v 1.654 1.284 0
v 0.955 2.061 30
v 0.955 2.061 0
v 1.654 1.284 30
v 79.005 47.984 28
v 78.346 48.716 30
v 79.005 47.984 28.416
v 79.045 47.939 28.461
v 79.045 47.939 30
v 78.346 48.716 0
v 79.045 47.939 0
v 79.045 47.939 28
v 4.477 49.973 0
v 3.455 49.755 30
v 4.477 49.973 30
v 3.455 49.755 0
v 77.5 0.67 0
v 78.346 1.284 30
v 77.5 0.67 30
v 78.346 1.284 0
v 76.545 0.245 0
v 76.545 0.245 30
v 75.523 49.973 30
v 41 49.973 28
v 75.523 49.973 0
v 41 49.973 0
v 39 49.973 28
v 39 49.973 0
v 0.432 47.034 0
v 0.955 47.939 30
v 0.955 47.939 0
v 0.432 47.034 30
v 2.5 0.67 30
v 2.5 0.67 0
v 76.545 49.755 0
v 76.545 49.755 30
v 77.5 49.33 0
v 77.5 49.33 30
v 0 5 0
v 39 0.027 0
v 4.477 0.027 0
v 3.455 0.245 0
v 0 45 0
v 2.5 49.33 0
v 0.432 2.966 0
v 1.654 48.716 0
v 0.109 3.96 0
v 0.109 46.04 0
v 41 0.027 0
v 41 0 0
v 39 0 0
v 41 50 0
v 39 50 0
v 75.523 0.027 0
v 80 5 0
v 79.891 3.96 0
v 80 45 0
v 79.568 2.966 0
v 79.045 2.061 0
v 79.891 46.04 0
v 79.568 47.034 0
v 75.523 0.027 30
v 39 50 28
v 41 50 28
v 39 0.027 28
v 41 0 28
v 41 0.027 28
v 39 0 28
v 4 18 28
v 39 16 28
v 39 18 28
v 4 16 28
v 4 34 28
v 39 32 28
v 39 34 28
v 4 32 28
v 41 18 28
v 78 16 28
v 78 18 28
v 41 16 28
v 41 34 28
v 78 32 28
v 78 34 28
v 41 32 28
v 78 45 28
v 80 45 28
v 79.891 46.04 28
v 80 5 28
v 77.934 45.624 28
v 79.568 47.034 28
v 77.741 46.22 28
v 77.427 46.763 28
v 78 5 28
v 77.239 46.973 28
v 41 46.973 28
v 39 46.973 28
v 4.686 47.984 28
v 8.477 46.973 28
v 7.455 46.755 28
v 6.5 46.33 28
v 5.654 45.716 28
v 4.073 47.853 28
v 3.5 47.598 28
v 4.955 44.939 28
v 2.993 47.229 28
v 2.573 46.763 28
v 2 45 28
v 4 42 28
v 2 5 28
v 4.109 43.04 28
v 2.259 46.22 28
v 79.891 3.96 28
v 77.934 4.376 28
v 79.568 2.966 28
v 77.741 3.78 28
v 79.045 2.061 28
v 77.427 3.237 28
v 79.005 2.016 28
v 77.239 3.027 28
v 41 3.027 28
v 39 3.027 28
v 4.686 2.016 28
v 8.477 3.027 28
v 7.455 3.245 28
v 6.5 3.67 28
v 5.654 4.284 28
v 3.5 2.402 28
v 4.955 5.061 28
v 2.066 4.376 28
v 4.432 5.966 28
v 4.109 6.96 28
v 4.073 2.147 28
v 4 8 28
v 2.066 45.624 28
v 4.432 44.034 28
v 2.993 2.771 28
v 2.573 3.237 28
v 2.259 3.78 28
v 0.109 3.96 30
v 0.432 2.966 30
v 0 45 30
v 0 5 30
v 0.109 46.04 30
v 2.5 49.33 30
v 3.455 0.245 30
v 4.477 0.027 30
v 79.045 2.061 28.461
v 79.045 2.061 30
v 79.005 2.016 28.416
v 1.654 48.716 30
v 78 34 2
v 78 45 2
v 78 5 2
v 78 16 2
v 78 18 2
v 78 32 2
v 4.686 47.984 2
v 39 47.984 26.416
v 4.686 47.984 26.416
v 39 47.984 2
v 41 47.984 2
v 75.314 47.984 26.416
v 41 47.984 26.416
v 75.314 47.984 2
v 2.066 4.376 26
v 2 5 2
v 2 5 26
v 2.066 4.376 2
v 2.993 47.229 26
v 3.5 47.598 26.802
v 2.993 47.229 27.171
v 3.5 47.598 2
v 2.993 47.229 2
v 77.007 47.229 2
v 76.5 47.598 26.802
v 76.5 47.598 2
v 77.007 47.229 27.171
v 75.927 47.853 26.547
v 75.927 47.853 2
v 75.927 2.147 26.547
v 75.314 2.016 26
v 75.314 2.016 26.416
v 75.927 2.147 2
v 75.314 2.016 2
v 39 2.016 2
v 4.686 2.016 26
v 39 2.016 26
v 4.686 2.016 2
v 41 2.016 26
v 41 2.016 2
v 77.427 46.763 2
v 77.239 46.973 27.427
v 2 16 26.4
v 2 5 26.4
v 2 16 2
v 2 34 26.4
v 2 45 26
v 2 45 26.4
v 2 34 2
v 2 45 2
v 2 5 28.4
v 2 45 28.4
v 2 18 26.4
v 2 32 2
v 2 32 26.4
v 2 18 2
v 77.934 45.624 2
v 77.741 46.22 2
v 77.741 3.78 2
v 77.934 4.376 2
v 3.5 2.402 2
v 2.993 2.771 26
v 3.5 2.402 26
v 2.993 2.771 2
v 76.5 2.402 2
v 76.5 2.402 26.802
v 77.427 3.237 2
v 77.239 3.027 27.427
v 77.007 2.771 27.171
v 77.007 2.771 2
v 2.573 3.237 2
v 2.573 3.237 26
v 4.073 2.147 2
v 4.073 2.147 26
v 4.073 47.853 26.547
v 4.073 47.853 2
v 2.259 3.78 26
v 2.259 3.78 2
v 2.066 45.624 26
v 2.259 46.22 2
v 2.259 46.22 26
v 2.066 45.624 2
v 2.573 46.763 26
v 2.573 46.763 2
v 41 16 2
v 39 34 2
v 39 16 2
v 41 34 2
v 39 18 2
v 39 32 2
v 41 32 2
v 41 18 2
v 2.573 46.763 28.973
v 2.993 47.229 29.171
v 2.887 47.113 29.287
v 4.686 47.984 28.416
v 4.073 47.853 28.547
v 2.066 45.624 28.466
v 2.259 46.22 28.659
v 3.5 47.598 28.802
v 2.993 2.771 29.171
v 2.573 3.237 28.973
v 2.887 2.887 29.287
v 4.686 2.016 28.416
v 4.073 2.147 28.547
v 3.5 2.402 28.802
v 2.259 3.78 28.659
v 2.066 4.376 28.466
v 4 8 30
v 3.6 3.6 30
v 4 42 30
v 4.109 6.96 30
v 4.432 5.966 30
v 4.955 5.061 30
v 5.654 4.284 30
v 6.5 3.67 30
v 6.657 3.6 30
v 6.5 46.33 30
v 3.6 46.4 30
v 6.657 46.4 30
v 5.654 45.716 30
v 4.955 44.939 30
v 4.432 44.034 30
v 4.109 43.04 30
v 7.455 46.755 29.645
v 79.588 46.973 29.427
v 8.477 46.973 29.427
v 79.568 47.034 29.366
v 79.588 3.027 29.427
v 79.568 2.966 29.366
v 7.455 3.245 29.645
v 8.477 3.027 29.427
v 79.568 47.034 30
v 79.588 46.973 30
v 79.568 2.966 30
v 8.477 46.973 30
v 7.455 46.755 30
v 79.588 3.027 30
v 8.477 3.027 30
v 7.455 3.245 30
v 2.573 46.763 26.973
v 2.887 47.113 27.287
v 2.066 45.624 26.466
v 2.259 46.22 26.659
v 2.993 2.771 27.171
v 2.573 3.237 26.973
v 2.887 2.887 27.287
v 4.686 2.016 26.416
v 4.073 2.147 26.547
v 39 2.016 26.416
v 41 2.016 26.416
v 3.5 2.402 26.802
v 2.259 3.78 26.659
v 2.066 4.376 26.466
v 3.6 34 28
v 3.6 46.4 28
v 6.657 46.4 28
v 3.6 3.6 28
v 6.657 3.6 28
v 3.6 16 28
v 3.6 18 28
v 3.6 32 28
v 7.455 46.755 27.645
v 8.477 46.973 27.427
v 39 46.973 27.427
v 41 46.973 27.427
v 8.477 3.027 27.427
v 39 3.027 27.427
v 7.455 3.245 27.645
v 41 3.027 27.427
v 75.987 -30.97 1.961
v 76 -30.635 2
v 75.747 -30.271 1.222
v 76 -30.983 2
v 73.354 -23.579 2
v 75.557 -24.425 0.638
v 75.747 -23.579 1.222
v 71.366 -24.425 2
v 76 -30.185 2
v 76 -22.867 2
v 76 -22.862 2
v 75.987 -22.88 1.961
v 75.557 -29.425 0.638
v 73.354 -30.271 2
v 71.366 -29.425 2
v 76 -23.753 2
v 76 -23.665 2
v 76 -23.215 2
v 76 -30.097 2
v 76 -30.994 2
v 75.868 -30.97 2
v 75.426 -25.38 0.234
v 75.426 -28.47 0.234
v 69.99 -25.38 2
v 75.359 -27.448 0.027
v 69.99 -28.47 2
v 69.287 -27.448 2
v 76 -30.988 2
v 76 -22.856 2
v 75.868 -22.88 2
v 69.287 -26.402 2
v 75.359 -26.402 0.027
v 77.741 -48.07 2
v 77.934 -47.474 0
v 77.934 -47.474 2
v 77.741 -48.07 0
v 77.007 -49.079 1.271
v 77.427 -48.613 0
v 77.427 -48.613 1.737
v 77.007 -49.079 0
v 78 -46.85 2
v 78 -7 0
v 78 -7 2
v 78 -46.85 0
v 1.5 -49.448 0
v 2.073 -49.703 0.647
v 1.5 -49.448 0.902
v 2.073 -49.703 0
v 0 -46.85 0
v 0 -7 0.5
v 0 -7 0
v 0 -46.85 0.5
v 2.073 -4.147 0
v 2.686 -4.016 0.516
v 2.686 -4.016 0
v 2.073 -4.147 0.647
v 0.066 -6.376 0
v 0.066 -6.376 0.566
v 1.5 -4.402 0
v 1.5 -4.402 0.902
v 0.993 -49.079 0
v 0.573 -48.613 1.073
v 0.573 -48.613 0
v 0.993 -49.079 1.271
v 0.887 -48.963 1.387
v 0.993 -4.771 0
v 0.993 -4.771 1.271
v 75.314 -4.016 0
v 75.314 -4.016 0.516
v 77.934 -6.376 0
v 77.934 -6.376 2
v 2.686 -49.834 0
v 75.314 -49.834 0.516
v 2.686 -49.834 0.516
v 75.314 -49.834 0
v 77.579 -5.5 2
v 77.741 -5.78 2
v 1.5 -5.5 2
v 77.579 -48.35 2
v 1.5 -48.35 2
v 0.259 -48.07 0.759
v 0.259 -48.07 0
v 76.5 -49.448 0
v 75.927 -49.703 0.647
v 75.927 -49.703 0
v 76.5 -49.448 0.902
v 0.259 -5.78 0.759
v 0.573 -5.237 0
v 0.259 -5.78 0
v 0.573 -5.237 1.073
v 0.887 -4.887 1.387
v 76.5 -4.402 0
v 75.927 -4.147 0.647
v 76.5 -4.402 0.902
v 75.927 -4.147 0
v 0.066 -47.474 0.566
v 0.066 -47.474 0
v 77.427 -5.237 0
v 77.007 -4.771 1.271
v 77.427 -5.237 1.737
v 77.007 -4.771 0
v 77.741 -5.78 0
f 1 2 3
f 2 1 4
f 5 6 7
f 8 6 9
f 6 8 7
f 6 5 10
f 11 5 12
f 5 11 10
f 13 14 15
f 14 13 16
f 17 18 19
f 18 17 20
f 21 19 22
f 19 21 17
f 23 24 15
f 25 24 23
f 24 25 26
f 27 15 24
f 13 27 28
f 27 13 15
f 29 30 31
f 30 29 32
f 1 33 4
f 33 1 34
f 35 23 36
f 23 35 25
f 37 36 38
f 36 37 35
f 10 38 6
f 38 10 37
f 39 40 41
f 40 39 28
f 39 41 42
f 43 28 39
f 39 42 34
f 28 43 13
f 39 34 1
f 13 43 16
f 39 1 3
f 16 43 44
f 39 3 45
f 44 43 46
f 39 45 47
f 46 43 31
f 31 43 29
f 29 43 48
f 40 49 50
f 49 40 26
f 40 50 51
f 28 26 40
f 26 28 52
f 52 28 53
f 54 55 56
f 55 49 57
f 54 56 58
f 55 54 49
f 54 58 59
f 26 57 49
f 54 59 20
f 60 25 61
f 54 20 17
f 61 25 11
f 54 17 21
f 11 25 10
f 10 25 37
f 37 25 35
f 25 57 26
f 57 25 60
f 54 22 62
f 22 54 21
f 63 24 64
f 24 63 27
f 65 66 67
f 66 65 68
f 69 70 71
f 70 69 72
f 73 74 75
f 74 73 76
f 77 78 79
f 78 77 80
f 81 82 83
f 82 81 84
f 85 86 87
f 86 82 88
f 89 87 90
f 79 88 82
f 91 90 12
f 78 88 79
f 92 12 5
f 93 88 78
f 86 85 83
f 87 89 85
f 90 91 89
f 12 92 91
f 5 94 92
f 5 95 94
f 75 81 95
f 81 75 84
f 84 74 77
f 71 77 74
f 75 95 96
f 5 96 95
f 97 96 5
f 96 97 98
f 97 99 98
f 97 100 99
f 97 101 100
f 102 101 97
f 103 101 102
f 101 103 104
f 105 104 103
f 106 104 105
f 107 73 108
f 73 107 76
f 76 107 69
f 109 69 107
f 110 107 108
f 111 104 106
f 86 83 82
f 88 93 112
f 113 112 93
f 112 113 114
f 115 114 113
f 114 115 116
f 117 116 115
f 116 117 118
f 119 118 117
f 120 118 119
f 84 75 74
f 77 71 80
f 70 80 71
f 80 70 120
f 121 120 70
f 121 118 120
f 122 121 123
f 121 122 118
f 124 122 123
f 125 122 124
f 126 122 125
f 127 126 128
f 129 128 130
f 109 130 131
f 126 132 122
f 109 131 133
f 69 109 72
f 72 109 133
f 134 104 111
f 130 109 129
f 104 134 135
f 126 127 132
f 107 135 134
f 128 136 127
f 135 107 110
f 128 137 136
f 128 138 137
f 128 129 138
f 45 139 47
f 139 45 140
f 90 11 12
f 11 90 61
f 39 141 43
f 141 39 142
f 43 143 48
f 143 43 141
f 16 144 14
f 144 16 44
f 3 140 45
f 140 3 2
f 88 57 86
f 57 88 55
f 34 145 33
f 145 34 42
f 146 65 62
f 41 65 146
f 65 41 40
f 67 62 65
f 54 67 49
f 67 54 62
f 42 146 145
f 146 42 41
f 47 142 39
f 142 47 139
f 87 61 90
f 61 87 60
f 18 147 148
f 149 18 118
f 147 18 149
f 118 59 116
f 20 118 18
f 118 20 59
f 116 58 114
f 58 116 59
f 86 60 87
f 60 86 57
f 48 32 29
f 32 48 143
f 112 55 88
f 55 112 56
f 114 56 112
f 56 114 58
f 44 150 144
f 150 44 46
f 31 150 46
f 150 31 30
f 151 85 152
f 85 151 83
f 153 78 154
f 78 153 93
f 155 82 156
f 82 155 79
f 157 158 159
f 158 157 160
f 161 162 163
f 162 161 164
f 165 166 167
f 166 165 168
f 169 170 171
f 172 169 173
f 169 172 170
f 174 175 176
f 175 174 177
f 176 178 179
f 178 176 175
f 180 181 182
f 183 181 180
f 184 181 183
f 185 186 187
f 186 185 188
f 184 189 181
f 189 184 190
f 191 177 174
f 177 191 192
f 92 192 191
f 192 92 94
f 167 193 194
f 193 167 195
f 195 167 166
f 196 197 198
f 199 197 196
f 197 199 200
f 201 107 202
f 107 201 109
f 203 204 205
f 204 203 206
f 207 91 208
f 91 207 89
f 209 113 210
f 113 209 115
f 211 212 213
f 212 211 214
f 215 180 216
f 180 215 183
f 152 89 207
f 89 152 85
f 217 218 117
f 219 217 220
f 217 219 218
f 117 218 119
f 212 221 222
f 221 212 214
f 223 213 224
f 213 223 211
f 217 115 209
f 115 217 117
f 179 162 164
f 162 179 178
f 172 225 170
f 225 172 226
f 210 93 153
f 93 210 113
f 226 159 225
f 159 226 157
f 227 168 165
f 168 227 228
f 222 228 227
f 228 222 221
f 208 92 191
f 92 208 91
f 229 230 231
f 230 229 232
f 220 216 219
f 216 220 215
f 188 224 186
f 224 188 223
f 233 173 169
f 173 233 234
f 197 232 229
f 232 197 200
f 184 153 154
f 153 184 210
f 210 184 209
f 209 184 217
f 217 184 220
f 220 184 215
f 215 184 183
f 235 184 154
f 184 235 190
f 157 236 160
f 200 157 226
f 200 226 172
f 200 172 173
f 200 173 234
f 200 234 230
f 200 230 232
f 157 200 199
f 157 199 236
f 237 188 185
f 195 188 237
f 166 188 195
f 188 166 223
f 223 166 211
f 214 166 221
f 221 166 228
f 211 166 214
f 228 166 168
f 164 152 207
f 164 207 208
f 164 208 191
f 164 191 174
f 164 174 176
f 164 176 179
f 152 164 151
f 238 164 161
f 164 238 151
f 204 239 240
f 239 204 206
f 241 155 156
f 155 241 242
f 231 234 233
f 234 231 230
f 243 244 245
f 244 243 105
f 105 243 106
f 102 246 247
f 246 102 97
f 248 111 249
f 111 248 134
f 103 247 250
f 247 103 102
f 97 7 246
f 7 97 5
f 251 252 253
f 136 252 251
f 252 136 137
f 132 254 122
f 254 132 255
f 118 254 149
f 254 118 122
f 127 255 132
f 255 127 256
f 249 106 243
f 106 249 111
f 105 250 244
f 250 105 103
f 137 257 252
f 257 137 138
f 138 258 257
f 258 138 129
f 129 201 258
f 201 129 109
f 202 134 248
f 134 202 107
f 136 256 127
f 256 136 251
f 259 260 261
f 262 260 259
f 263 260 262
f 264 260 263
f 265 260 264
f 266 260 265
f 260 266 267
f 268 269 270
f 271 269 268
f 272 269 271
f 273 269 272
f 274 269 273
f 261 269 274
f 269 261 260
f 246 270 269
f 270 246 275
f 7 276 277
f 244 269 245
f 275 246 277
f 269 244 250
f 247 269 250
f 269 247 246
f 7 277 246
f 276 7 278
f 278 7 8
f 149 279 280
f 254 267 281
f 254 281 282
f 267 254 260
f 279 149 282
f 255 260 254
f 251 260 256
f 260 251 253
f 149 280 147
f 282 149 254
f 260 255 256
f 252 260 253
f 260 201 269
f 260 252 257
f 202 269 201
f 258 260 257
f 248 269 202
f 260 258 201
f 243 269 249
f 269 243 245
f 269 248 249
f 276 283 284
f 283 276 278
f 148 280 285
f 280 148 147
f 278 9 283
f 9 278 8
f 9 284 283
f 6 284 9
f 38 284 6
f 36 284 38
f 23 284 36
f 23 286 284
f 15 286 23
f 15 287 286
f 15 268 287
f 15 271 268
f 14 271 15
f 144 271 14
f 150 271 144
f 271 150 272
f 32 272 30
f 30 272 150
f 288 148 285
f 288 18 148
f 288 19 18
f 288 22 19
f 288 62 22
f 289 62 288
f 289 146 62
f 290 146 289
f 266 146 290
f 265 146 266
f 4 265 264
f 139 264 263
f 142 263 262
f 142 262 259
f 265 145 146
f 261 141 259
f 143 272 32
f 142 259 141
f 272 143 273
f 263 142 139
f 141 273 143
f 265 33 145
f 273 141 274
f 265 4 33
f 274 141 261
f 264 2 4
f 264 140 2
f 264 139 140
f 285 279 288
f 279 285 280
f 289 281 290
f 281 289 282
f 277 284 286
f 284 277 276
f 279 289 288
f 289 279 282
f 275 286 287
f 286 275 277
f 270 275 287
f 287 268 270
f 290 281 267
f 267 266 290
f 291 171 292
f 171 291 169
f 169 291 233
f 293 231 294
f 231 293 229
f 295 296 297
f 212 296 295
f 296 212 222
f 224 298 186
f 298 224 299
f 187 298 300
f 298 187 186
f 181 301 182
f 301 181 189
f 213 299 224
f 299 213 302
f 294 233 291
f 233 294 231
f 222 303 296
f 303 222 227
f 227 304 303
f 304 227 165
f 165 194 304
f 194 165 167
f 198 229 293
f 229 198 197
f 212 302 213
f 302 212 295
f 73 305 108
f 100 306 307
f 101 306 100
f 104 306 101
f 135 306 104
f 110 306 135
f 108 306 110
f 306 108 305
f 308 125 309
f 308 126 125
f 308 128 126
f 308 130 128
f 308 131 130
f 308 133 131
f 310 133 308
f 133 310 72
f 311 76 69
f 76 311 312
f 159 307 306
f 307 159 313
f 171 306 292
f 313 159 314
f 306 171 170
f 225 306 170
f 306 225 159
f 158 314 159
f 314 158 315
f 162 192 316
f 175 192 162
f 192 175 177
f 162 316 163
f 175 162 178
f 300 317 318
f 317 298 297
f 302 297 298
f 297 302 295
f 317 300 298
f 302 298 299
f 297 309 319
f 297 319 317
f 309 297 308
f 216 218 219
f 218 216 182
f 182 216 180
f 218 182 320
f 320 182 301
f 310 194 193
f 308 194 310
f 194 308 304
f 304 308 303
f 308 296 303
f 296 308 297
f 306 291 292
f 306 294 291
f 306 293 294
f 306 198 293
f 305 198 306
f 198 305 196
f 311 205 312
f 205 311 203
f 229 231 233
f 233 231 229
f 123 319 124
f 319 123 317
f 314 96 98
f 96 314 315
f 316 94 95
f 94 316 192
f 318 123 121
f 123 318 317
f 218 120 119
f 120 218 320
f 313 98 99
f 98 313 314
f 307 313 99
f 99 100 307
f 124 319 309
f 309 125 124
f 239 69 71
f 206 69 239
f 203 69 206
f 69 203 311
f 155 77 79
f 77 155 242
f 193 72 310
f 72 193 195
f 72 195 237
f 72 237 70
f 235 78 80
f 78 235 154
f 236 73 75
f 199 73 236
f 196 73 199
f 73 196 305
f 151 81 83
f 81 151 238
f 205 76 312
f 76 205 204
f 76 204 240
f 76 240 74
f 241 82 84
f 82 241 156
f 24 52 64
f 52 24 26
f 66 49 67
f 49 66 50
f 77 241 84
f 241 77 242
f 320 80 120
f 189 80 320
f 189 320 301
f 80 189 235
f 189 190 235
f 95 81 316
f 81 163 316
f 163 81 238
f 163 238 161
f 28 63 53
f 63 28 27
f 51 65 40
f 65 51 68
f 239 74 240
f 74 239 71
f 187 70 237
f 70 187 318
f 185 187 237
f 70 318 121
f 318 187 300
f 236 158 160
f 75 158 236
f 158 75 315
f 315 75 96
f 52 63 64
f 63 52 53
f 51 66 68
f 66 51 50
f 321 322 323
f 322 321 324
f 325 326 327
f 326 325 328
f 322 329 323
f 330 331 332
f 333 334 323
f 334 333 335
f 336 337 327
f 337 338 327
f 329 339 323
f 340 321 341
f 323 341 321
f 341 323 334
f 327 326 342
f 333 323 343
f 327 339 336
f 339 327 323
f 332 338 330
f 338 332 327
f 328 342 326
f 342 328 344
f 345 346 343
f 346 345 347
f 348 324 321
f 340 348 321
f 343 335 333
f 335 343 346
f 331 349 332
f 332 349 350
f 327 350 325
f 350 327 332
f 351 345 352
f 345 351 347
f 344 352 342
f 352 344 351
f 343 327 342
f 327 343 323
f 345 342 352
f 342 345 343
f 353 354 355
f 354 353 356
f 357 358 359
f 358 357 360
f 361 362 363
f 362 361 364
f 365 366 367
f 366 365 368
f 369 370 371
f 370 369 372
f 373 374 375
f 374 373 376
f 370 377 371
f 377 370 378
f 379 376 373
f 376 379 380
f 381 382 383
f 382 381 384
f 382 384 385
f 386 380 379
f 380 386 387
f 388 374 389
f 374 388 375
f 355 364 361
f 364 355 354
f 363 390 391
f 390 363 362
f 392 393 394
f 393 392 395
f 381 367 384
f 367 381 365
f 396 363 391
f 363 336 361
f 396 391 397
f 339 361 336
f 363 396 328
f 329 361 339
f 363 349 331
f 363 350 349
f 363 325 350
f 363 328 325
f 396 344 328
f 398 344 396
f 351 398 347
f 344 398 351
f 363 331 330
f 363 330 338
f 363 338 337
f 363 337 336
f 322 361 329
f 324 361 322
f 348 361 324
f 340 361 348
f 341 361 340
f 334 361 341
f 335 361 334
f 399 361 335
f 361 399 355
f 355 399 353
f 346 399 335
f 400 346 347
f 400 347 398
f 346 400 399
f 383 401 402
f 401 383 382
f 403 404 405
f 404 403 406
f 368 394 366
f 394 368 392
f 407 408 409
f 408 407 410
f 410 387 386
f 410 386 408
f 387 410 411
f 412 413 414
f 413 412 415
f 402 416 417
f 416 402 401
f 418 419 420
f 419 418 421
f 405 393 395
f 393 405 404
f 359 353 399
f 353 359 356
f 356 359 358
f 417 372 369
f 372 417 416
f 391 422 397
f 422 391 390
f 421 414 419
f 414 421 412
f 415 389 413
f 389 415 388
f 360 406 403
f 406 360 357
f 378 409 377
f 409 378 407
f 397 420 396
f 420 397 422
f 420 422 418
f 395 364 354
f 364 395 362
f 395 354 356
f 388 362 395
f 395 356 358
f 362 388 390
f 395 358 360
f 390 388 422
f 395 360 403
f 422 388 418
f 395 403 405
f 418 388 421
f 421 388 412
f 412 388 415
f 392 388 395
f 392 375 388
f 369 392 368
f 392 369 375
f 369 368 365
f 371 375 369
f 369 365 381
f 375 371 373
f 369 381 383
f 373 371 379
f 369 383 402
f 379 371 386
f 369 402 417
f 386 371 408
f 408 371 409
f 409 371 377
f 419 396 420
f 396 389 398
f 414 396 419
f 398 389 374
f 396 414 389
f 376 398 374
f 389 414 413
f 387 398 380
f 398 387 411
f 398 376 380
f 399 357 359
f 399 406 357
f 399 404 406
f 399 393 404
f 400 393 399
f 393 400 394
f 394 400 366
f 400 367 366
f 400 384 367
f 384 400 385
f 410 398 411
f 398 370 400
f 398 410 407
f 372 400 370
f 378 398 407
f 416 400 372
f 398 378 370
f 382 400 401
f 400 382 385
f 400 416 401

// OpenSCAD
itemsShown="both"; // [both,box,lid]
boxLength=80;
boxWidth=50;
boxHeight=30;
cornerRadius=5;
wallThickness=2;
bottomThickness=2;
lidThickness=2;
lidClearance=0.15;
lidEdgeThickness=0.5;
// Notch in the lid
withNotch=true;//true;//[true:false]

//partition
partition = "show"; //[show,hide]
xcount = 3;
ycount = 2;

/* [Global] */
if (itemsShown=="box") showBox();
if (itemsShown=="lid") showLid();
if (itemsShown=="both"){showBox();showLid();}

module showLid(){
	translate ([0, -2*wallThickness, 0]) 
	roundBoxLid(l=boxLength-wallThickness,
				w=boxWidth-2*wallThickness-lidClearance,
				h=lidThickness,
				et=lidEdgeThickness,
				r=cornerRadius-wallThickness,
				notch=withNotch);
}

module showBox(){
    union()
    {
        round_box(l=boxLength,
                  w=boxWidth,
                  h=boxHeight,
                  bt=bottomThickness,
                  wt=wallThickness,
                  lt=lidThickness,
                  r=cornerRadius);
        if(partition=="show") partition();
    }
}

module round_box(l=40,w=30,h=30,bt=2,wt=2,lt=2,r=5,){
    difference() { 
        round_cube(l=l,w=w,h=h-lt,r=r);
        translate ([wt, wt, bt]) 
        round_cube(l=l-wt*2,w=w-wt*2,h=h,r=r-wt);
    }
    //use two box rims. one to make a slope to support the lid
    roundBoxRim();
    translate ([0, 0, -wt]) roundBoxRim();
}

module partition(l=boxLength,w=boxWidth,h=boxHeight,wt=wallThickness){
        for(i=[0:xcount]){
            pw=((w-wt)/xcount);
            difference()
            {
                translate([0,(pw)*i,0])cube([l,wt,h-wt]);
                translate([0,0,0])cube([l,wt,h-wt]);
                translate([0,w-wt,0])cube([l,wt,h-wt]);
            }
        }
        for(i=[0:ycount]){
            pw=((l-wt)/ycount);
            difference()
            {
                translate([(pw)*i,0,0])cube([wt,w,h-wt]);
                translate([0,0,0])cube([wt,w,h-wt]);
                translate([l-wt,0,0])cube([wt,w,h-wt]);
            }
        }
}

module roundBoxRim(l=boxLength,
				   w=boxWidth,
				   h=boxHeight,
				   et=lidEdgeThickness,
				   r=cornerRadius,
				   wt=wallThickness,
				   lt=lidThickness){
	difference() { 
		translate ([0, 0, h-lt]) 
		round_cube(l=l,w=w,h=lt,r=r);
		translate ([wt+lt,wt+lt-et*2,h-lt-0.1]) 
		round_cube(l=l*2,w=w-2*(wt+lt)+4*et,h=lt+0.2,r=r-wt+lt);

		//subtract out a lid to make the ledge
		translate ([wt, w-wt, h-lt-0.1])
		roundBoxLid(l=l*2,w=w-2*wt,h=lt+0.1,wt=wt,t=lt,et=0.5,r=r-wt,notch=false);
	}
}

module roundBoxLid(l=40,w=30,h=3,wt=2,t=2,et=0.5,r=5,notch=true){
	translate ([l, 0, 0]) 
	rotate (a = [0, 0, 180]) 
	difference(){
		round_cube(l=l,w=w,h=h,t=t,r=r);

		translate ([-1, 0, et]) rotate (a = [45, 0, 0])  cube (size = [l+2, h*2, h*2]); 
		translate ([-1, w, et]) rotate (a = [45, 0, 0])  cube (size = [l+2, h*2, h*2]); 
		translate ([l, -1, et]) rotate (a = [45, 0, 90]) cube (size = [w+2, h*2, h*2]); 
		if (notch==true){
			translate([2,w/2,h+0.001]) thumbNotch(10/2,72,t);
		}
	}
}

module thumbNotch(
	thumbR=12/2,
	angle=72,
	notchHeight=2){

	size=10*thumbR;

	rotate([0,0,90])
	difference(){
		translate([0,
					(thumbR*sin(angle)-notchHeight)/tan(angle),
					 thumbR*sin(angle)-notchHeight])
		rotate([angle,0,0])
		cylinder(r=thumbR,h=size,$fn=30);

		translate([-size,-size,0])
		cube(size*2);
	}
}

module round_cube(l=40,w=30,h=20,r=5,$fn=30){
	hull(){ 
		translate ([r, r, 0]) cylinder (h = h, r=r);
		translate ([r, w-r, 0]) cylinder (h = h, r=r);
		translate ([l-r,w-r, 0]) cylinder (h = h, r=r);
		translate ([l-r, r, 0]) cylinder (h = h, r=r);
	}
}
